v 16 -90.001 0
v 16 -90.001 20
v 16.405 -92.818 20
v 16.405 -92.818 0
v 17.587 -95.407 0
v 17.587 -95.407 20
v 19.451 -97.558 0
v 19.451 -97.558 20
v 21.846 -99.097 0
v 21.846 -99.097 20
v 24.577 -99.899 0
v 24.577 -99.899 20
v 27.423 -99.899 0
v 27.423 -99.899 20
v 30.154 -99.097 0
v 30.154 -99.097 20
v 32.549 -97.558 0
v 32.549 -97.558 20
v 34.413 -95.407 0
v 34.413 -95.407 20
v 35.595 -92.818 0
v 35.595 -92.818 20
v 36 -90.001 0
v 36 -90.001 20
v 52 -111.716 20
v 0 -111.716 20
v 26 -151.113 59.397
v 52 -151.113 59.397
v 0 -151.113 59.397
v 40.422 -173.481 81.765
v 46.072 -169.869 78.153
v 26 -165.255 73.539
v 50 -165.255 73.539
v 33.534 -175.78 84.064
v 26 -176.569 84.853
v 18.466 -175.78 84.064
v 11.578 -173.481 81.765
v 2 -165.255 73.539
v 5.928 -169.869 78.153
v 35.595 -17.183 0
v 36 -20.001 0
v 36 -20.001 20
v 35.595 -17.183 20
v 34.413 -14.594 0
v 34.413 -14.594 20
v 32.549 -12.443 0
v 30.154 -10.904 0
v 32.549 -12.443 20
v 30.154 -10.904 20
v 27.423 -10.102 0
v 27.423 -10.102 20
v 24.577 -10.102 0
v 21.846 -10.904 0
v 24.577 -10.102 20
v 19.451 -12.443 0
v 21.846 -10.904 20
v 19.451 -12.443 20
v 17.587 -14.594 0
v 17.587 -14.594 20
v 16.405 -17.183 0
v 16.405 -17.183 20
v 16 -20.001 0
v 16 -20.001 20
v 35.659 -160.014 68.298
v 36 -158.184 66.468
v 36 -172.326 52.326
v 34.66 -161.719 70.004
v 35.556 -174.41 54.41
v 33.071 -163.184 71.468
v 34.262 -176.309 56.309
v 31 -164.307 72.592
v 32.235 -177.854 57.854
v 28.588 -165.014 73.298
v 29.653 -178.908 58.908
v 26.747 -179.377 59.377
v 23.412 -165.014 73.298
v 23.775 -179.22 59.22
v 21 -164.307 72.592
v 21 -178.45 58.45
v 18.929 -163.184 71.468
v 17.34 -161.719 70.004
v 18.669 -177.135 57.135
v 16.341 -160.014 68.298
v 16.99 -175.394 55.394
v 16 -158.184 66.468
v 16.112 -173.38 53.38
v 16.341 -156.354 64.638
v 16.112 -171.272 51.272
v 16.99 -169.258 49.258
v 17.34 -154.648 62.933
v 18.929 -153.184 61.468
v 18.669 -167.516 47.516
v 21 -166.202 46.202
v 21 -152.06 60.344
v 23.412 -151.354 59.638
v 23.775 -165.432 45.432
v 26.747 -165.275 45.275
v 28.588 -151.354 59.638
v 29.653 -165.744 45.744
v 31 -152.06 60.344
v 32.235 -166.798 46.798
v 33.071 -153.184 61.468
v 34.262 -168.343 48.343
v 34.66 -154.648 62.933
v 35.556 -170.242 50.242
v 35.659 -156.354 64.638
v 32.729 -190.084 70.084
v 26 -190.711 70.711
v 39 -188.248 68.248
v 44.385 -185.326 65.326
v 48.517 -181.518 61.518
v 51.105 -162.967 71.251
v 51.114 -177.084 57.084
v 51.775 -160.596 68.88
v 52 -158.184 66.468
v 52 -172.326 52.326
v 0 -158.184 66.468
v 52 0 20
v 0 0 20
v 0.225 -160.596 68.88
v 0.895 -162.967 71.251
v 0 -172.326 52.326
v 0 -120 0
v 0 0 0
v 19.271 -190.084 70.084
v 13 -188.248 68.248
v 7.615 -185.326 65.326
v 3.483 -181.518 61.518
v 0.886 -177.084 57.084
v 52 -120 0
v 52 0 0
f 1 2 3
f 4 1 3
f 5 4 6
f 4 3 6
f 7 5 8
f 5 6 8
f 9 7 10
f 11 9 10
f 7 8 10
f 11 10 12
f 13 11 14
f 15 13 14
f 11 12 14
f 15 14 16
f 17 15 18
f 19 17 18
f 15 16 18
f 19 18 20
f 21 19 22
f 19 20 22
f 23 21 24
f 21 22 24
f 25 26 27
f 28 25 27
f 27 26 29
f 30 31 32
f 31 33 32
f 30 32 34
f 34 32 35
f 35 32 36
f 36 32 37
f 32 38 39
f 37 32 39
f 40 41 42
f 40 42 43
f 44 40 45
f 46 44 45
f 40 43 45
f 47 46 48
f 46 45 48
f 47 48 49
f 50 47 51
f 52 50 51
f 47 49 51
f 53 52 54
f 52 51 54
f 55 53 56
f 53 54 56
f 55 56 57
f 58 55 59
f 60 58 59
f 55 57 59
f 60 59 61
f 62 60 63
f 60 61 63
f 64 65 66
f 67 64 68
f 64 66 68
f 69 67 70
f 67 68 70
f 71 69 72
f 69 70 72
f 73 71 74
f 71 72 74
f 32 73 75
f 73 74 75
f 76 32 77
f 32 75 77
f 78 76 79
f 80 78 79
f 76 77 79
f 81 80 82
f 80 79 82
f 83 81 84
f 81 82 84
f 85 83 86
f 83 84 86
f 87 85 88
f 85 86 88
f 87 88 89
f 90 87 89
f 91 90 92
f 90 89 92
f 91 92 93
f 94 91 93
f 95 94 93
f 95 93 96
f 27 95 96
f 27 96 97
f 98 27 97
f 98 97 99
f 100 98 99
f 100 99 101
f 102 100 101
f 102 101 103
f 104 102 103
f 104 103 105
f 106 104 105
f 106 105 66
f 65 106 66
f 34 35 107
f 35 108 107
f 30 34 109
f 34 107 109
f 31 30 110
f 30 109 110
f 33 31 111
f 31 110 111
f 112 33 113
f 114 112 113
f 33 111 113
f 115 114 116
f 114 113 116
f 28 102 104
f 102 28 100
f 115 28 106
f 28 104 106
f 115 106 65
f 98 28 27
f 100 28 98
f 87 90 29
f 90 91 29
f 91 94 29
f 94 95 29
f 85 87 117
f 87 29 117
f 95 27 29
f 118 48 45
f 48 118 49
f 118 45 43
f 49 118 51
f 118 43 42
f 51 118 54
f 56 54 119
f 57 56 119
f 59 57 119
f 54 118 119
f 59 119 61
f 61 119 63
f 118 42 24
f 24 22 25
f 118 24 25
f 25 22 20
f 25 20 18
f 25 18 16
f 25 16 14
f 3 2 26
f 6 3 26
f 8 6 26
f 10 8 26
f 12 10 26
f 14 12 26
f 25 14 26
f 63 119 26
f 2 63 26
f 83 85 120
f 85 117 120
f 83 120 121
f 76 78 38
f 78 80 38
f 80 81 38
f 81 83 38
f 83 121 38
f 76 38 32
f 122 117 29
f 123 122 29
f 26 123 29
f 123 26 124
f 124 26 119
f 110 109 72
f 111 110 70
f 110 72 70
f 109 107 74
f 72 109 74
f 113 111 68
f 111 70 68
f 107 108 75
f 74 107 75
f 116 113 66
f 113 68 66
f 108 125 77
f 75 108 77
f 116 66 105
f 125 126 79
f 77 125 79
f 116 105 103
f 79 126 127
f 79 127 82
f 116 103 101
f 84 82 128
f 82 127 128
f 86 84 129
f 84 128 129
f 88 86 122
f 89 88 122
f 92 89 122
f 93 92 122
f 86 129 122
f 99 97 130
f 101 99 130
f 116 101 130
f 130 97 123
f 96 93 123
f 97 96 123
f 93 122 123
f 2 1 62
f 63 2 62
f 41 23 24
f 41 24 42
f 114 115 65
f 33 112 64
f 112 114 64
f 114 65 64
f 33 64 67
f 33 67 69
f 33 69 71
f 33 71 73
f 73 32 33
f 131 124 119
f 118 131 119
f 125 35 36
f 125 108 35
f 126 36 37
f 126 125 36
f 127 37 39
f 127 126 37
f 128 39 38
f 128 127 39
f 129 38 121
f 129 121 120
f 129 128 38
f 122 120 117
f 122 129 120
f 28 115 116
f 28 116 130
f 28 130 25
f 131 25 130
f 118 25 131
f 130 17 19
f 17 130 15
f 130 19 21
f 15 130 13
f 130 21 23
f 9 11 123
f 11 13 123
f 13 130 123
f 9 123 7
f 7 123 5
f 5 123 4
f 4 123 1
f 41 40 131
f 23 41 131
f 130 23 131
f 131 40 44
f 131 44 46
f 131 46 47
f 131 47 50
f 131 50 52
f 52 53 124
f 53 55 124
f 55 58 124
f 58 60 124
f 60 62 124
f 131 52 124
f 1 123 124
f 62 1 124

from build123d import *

# Parameters (mm, degrees)
F0_W     = 10
F0_H     = 20
F0_W_2   = 50
F2_DEPTH = 52
F3_R     = 25.99999
F4_D     = 20
F1_W     = 10
F1_H     = 70
F5_DEPTH = 47
F7_D     = 20


# Not quite as in the source:
# - a fillet or chamfer is up to 0.001 mm smaller than in the source, because OpenCascade refuses the exact size


with BuildPart() as f2:
    # F0 (on Right) → F2 (new body)
    with BuildSketch(Plane.YZ):
        with Locations((-5, 10)):
            Rectangle(F0_W, F0_H)
        with Locations((-15, 10)):
            Rectangle(F0_W, F0_H)
        with Locations((-25, 10)):
            Rectangle(F0_W, F0_H)
        with Locations((-55, 10)):
            Rectangle(F0_W_2, F0_H)
        with Locations((-85, 10)):
            Rectangle(F0_W, F0_H)
        with Locations((-95, 10)):
            Rectangle(F0_W, F0_H)
        Polygon((-120, 0), (-100, 0), (-100, 20), (-111.7157287525, 20), (-151.1126983722, 59.3969696197), (-165.2548339959, 45.2548339959), align=None)
        Polygon((-172.3259018078, 52.3259018078), (-165.2548339959, 45.2548339959), (-151.1126983722, 59.3969696197), (-158.1837661841, 66.4680374315), align=None)
        Polygon((-179.3969696197, 59.3969696197), (-172.3259018078, 52.3259018078), (-158.1837661841, 66.4680374315), (-165.2548339959, 73.5391052434), align=None)
        Polygon((-190.7106781187, 70.7106781187), (-179.3969696197, 59.3969696197), (-165.2548339959, 73.5391052434), (-176.5685424949, 84.8528137424), align=None)
    extrude(amount=F2_DEPTH)

    # F3 (radius 26 in the source; OpenCascade refuses exactly that, so slightly less here)
    f3_edges = [f2.edges().sort_by_distance(p)[0] for p in [
        (52, -183.63961, 77.781746),
        (0, -183.63961, 77.781746),
    ]]
    fillet(f3_edges, radius=F3_R)

    # F4 (through all)
    with Locations(Plane(origin=(0, 0, 0), x_dir=(1, 0, 0), z_dir=(0, 0, -1))):
        with Locations((26, 90.0006328523), (26, 20.0006328523)):
            Hole(F4_D / 2)

    # F1 (on Top) → F5 (cut)
    with BuildSketch(Plane.XY):
        with Locations((31, -55.0006328523)):
            Rectangle(F1_W, F1_H)
        with Locations((21, -55.0006328523)):
            Rectangle(F1_W, F1_H)
    extrude(amount=F5_DEPTH, mode=Mode.SUBTRACT)

    # F7 (through all)
    with Locations(Plane(origin=(0, -45.8578643763, -45.8578643763), x_dir=(-1, 0, 0), z_dir=(0, 0.7071067812, 0.7071067812))):
        with Locations((-26, 158.8528137424)):
            Hole(F7_D / 2)


solid = f2.part
